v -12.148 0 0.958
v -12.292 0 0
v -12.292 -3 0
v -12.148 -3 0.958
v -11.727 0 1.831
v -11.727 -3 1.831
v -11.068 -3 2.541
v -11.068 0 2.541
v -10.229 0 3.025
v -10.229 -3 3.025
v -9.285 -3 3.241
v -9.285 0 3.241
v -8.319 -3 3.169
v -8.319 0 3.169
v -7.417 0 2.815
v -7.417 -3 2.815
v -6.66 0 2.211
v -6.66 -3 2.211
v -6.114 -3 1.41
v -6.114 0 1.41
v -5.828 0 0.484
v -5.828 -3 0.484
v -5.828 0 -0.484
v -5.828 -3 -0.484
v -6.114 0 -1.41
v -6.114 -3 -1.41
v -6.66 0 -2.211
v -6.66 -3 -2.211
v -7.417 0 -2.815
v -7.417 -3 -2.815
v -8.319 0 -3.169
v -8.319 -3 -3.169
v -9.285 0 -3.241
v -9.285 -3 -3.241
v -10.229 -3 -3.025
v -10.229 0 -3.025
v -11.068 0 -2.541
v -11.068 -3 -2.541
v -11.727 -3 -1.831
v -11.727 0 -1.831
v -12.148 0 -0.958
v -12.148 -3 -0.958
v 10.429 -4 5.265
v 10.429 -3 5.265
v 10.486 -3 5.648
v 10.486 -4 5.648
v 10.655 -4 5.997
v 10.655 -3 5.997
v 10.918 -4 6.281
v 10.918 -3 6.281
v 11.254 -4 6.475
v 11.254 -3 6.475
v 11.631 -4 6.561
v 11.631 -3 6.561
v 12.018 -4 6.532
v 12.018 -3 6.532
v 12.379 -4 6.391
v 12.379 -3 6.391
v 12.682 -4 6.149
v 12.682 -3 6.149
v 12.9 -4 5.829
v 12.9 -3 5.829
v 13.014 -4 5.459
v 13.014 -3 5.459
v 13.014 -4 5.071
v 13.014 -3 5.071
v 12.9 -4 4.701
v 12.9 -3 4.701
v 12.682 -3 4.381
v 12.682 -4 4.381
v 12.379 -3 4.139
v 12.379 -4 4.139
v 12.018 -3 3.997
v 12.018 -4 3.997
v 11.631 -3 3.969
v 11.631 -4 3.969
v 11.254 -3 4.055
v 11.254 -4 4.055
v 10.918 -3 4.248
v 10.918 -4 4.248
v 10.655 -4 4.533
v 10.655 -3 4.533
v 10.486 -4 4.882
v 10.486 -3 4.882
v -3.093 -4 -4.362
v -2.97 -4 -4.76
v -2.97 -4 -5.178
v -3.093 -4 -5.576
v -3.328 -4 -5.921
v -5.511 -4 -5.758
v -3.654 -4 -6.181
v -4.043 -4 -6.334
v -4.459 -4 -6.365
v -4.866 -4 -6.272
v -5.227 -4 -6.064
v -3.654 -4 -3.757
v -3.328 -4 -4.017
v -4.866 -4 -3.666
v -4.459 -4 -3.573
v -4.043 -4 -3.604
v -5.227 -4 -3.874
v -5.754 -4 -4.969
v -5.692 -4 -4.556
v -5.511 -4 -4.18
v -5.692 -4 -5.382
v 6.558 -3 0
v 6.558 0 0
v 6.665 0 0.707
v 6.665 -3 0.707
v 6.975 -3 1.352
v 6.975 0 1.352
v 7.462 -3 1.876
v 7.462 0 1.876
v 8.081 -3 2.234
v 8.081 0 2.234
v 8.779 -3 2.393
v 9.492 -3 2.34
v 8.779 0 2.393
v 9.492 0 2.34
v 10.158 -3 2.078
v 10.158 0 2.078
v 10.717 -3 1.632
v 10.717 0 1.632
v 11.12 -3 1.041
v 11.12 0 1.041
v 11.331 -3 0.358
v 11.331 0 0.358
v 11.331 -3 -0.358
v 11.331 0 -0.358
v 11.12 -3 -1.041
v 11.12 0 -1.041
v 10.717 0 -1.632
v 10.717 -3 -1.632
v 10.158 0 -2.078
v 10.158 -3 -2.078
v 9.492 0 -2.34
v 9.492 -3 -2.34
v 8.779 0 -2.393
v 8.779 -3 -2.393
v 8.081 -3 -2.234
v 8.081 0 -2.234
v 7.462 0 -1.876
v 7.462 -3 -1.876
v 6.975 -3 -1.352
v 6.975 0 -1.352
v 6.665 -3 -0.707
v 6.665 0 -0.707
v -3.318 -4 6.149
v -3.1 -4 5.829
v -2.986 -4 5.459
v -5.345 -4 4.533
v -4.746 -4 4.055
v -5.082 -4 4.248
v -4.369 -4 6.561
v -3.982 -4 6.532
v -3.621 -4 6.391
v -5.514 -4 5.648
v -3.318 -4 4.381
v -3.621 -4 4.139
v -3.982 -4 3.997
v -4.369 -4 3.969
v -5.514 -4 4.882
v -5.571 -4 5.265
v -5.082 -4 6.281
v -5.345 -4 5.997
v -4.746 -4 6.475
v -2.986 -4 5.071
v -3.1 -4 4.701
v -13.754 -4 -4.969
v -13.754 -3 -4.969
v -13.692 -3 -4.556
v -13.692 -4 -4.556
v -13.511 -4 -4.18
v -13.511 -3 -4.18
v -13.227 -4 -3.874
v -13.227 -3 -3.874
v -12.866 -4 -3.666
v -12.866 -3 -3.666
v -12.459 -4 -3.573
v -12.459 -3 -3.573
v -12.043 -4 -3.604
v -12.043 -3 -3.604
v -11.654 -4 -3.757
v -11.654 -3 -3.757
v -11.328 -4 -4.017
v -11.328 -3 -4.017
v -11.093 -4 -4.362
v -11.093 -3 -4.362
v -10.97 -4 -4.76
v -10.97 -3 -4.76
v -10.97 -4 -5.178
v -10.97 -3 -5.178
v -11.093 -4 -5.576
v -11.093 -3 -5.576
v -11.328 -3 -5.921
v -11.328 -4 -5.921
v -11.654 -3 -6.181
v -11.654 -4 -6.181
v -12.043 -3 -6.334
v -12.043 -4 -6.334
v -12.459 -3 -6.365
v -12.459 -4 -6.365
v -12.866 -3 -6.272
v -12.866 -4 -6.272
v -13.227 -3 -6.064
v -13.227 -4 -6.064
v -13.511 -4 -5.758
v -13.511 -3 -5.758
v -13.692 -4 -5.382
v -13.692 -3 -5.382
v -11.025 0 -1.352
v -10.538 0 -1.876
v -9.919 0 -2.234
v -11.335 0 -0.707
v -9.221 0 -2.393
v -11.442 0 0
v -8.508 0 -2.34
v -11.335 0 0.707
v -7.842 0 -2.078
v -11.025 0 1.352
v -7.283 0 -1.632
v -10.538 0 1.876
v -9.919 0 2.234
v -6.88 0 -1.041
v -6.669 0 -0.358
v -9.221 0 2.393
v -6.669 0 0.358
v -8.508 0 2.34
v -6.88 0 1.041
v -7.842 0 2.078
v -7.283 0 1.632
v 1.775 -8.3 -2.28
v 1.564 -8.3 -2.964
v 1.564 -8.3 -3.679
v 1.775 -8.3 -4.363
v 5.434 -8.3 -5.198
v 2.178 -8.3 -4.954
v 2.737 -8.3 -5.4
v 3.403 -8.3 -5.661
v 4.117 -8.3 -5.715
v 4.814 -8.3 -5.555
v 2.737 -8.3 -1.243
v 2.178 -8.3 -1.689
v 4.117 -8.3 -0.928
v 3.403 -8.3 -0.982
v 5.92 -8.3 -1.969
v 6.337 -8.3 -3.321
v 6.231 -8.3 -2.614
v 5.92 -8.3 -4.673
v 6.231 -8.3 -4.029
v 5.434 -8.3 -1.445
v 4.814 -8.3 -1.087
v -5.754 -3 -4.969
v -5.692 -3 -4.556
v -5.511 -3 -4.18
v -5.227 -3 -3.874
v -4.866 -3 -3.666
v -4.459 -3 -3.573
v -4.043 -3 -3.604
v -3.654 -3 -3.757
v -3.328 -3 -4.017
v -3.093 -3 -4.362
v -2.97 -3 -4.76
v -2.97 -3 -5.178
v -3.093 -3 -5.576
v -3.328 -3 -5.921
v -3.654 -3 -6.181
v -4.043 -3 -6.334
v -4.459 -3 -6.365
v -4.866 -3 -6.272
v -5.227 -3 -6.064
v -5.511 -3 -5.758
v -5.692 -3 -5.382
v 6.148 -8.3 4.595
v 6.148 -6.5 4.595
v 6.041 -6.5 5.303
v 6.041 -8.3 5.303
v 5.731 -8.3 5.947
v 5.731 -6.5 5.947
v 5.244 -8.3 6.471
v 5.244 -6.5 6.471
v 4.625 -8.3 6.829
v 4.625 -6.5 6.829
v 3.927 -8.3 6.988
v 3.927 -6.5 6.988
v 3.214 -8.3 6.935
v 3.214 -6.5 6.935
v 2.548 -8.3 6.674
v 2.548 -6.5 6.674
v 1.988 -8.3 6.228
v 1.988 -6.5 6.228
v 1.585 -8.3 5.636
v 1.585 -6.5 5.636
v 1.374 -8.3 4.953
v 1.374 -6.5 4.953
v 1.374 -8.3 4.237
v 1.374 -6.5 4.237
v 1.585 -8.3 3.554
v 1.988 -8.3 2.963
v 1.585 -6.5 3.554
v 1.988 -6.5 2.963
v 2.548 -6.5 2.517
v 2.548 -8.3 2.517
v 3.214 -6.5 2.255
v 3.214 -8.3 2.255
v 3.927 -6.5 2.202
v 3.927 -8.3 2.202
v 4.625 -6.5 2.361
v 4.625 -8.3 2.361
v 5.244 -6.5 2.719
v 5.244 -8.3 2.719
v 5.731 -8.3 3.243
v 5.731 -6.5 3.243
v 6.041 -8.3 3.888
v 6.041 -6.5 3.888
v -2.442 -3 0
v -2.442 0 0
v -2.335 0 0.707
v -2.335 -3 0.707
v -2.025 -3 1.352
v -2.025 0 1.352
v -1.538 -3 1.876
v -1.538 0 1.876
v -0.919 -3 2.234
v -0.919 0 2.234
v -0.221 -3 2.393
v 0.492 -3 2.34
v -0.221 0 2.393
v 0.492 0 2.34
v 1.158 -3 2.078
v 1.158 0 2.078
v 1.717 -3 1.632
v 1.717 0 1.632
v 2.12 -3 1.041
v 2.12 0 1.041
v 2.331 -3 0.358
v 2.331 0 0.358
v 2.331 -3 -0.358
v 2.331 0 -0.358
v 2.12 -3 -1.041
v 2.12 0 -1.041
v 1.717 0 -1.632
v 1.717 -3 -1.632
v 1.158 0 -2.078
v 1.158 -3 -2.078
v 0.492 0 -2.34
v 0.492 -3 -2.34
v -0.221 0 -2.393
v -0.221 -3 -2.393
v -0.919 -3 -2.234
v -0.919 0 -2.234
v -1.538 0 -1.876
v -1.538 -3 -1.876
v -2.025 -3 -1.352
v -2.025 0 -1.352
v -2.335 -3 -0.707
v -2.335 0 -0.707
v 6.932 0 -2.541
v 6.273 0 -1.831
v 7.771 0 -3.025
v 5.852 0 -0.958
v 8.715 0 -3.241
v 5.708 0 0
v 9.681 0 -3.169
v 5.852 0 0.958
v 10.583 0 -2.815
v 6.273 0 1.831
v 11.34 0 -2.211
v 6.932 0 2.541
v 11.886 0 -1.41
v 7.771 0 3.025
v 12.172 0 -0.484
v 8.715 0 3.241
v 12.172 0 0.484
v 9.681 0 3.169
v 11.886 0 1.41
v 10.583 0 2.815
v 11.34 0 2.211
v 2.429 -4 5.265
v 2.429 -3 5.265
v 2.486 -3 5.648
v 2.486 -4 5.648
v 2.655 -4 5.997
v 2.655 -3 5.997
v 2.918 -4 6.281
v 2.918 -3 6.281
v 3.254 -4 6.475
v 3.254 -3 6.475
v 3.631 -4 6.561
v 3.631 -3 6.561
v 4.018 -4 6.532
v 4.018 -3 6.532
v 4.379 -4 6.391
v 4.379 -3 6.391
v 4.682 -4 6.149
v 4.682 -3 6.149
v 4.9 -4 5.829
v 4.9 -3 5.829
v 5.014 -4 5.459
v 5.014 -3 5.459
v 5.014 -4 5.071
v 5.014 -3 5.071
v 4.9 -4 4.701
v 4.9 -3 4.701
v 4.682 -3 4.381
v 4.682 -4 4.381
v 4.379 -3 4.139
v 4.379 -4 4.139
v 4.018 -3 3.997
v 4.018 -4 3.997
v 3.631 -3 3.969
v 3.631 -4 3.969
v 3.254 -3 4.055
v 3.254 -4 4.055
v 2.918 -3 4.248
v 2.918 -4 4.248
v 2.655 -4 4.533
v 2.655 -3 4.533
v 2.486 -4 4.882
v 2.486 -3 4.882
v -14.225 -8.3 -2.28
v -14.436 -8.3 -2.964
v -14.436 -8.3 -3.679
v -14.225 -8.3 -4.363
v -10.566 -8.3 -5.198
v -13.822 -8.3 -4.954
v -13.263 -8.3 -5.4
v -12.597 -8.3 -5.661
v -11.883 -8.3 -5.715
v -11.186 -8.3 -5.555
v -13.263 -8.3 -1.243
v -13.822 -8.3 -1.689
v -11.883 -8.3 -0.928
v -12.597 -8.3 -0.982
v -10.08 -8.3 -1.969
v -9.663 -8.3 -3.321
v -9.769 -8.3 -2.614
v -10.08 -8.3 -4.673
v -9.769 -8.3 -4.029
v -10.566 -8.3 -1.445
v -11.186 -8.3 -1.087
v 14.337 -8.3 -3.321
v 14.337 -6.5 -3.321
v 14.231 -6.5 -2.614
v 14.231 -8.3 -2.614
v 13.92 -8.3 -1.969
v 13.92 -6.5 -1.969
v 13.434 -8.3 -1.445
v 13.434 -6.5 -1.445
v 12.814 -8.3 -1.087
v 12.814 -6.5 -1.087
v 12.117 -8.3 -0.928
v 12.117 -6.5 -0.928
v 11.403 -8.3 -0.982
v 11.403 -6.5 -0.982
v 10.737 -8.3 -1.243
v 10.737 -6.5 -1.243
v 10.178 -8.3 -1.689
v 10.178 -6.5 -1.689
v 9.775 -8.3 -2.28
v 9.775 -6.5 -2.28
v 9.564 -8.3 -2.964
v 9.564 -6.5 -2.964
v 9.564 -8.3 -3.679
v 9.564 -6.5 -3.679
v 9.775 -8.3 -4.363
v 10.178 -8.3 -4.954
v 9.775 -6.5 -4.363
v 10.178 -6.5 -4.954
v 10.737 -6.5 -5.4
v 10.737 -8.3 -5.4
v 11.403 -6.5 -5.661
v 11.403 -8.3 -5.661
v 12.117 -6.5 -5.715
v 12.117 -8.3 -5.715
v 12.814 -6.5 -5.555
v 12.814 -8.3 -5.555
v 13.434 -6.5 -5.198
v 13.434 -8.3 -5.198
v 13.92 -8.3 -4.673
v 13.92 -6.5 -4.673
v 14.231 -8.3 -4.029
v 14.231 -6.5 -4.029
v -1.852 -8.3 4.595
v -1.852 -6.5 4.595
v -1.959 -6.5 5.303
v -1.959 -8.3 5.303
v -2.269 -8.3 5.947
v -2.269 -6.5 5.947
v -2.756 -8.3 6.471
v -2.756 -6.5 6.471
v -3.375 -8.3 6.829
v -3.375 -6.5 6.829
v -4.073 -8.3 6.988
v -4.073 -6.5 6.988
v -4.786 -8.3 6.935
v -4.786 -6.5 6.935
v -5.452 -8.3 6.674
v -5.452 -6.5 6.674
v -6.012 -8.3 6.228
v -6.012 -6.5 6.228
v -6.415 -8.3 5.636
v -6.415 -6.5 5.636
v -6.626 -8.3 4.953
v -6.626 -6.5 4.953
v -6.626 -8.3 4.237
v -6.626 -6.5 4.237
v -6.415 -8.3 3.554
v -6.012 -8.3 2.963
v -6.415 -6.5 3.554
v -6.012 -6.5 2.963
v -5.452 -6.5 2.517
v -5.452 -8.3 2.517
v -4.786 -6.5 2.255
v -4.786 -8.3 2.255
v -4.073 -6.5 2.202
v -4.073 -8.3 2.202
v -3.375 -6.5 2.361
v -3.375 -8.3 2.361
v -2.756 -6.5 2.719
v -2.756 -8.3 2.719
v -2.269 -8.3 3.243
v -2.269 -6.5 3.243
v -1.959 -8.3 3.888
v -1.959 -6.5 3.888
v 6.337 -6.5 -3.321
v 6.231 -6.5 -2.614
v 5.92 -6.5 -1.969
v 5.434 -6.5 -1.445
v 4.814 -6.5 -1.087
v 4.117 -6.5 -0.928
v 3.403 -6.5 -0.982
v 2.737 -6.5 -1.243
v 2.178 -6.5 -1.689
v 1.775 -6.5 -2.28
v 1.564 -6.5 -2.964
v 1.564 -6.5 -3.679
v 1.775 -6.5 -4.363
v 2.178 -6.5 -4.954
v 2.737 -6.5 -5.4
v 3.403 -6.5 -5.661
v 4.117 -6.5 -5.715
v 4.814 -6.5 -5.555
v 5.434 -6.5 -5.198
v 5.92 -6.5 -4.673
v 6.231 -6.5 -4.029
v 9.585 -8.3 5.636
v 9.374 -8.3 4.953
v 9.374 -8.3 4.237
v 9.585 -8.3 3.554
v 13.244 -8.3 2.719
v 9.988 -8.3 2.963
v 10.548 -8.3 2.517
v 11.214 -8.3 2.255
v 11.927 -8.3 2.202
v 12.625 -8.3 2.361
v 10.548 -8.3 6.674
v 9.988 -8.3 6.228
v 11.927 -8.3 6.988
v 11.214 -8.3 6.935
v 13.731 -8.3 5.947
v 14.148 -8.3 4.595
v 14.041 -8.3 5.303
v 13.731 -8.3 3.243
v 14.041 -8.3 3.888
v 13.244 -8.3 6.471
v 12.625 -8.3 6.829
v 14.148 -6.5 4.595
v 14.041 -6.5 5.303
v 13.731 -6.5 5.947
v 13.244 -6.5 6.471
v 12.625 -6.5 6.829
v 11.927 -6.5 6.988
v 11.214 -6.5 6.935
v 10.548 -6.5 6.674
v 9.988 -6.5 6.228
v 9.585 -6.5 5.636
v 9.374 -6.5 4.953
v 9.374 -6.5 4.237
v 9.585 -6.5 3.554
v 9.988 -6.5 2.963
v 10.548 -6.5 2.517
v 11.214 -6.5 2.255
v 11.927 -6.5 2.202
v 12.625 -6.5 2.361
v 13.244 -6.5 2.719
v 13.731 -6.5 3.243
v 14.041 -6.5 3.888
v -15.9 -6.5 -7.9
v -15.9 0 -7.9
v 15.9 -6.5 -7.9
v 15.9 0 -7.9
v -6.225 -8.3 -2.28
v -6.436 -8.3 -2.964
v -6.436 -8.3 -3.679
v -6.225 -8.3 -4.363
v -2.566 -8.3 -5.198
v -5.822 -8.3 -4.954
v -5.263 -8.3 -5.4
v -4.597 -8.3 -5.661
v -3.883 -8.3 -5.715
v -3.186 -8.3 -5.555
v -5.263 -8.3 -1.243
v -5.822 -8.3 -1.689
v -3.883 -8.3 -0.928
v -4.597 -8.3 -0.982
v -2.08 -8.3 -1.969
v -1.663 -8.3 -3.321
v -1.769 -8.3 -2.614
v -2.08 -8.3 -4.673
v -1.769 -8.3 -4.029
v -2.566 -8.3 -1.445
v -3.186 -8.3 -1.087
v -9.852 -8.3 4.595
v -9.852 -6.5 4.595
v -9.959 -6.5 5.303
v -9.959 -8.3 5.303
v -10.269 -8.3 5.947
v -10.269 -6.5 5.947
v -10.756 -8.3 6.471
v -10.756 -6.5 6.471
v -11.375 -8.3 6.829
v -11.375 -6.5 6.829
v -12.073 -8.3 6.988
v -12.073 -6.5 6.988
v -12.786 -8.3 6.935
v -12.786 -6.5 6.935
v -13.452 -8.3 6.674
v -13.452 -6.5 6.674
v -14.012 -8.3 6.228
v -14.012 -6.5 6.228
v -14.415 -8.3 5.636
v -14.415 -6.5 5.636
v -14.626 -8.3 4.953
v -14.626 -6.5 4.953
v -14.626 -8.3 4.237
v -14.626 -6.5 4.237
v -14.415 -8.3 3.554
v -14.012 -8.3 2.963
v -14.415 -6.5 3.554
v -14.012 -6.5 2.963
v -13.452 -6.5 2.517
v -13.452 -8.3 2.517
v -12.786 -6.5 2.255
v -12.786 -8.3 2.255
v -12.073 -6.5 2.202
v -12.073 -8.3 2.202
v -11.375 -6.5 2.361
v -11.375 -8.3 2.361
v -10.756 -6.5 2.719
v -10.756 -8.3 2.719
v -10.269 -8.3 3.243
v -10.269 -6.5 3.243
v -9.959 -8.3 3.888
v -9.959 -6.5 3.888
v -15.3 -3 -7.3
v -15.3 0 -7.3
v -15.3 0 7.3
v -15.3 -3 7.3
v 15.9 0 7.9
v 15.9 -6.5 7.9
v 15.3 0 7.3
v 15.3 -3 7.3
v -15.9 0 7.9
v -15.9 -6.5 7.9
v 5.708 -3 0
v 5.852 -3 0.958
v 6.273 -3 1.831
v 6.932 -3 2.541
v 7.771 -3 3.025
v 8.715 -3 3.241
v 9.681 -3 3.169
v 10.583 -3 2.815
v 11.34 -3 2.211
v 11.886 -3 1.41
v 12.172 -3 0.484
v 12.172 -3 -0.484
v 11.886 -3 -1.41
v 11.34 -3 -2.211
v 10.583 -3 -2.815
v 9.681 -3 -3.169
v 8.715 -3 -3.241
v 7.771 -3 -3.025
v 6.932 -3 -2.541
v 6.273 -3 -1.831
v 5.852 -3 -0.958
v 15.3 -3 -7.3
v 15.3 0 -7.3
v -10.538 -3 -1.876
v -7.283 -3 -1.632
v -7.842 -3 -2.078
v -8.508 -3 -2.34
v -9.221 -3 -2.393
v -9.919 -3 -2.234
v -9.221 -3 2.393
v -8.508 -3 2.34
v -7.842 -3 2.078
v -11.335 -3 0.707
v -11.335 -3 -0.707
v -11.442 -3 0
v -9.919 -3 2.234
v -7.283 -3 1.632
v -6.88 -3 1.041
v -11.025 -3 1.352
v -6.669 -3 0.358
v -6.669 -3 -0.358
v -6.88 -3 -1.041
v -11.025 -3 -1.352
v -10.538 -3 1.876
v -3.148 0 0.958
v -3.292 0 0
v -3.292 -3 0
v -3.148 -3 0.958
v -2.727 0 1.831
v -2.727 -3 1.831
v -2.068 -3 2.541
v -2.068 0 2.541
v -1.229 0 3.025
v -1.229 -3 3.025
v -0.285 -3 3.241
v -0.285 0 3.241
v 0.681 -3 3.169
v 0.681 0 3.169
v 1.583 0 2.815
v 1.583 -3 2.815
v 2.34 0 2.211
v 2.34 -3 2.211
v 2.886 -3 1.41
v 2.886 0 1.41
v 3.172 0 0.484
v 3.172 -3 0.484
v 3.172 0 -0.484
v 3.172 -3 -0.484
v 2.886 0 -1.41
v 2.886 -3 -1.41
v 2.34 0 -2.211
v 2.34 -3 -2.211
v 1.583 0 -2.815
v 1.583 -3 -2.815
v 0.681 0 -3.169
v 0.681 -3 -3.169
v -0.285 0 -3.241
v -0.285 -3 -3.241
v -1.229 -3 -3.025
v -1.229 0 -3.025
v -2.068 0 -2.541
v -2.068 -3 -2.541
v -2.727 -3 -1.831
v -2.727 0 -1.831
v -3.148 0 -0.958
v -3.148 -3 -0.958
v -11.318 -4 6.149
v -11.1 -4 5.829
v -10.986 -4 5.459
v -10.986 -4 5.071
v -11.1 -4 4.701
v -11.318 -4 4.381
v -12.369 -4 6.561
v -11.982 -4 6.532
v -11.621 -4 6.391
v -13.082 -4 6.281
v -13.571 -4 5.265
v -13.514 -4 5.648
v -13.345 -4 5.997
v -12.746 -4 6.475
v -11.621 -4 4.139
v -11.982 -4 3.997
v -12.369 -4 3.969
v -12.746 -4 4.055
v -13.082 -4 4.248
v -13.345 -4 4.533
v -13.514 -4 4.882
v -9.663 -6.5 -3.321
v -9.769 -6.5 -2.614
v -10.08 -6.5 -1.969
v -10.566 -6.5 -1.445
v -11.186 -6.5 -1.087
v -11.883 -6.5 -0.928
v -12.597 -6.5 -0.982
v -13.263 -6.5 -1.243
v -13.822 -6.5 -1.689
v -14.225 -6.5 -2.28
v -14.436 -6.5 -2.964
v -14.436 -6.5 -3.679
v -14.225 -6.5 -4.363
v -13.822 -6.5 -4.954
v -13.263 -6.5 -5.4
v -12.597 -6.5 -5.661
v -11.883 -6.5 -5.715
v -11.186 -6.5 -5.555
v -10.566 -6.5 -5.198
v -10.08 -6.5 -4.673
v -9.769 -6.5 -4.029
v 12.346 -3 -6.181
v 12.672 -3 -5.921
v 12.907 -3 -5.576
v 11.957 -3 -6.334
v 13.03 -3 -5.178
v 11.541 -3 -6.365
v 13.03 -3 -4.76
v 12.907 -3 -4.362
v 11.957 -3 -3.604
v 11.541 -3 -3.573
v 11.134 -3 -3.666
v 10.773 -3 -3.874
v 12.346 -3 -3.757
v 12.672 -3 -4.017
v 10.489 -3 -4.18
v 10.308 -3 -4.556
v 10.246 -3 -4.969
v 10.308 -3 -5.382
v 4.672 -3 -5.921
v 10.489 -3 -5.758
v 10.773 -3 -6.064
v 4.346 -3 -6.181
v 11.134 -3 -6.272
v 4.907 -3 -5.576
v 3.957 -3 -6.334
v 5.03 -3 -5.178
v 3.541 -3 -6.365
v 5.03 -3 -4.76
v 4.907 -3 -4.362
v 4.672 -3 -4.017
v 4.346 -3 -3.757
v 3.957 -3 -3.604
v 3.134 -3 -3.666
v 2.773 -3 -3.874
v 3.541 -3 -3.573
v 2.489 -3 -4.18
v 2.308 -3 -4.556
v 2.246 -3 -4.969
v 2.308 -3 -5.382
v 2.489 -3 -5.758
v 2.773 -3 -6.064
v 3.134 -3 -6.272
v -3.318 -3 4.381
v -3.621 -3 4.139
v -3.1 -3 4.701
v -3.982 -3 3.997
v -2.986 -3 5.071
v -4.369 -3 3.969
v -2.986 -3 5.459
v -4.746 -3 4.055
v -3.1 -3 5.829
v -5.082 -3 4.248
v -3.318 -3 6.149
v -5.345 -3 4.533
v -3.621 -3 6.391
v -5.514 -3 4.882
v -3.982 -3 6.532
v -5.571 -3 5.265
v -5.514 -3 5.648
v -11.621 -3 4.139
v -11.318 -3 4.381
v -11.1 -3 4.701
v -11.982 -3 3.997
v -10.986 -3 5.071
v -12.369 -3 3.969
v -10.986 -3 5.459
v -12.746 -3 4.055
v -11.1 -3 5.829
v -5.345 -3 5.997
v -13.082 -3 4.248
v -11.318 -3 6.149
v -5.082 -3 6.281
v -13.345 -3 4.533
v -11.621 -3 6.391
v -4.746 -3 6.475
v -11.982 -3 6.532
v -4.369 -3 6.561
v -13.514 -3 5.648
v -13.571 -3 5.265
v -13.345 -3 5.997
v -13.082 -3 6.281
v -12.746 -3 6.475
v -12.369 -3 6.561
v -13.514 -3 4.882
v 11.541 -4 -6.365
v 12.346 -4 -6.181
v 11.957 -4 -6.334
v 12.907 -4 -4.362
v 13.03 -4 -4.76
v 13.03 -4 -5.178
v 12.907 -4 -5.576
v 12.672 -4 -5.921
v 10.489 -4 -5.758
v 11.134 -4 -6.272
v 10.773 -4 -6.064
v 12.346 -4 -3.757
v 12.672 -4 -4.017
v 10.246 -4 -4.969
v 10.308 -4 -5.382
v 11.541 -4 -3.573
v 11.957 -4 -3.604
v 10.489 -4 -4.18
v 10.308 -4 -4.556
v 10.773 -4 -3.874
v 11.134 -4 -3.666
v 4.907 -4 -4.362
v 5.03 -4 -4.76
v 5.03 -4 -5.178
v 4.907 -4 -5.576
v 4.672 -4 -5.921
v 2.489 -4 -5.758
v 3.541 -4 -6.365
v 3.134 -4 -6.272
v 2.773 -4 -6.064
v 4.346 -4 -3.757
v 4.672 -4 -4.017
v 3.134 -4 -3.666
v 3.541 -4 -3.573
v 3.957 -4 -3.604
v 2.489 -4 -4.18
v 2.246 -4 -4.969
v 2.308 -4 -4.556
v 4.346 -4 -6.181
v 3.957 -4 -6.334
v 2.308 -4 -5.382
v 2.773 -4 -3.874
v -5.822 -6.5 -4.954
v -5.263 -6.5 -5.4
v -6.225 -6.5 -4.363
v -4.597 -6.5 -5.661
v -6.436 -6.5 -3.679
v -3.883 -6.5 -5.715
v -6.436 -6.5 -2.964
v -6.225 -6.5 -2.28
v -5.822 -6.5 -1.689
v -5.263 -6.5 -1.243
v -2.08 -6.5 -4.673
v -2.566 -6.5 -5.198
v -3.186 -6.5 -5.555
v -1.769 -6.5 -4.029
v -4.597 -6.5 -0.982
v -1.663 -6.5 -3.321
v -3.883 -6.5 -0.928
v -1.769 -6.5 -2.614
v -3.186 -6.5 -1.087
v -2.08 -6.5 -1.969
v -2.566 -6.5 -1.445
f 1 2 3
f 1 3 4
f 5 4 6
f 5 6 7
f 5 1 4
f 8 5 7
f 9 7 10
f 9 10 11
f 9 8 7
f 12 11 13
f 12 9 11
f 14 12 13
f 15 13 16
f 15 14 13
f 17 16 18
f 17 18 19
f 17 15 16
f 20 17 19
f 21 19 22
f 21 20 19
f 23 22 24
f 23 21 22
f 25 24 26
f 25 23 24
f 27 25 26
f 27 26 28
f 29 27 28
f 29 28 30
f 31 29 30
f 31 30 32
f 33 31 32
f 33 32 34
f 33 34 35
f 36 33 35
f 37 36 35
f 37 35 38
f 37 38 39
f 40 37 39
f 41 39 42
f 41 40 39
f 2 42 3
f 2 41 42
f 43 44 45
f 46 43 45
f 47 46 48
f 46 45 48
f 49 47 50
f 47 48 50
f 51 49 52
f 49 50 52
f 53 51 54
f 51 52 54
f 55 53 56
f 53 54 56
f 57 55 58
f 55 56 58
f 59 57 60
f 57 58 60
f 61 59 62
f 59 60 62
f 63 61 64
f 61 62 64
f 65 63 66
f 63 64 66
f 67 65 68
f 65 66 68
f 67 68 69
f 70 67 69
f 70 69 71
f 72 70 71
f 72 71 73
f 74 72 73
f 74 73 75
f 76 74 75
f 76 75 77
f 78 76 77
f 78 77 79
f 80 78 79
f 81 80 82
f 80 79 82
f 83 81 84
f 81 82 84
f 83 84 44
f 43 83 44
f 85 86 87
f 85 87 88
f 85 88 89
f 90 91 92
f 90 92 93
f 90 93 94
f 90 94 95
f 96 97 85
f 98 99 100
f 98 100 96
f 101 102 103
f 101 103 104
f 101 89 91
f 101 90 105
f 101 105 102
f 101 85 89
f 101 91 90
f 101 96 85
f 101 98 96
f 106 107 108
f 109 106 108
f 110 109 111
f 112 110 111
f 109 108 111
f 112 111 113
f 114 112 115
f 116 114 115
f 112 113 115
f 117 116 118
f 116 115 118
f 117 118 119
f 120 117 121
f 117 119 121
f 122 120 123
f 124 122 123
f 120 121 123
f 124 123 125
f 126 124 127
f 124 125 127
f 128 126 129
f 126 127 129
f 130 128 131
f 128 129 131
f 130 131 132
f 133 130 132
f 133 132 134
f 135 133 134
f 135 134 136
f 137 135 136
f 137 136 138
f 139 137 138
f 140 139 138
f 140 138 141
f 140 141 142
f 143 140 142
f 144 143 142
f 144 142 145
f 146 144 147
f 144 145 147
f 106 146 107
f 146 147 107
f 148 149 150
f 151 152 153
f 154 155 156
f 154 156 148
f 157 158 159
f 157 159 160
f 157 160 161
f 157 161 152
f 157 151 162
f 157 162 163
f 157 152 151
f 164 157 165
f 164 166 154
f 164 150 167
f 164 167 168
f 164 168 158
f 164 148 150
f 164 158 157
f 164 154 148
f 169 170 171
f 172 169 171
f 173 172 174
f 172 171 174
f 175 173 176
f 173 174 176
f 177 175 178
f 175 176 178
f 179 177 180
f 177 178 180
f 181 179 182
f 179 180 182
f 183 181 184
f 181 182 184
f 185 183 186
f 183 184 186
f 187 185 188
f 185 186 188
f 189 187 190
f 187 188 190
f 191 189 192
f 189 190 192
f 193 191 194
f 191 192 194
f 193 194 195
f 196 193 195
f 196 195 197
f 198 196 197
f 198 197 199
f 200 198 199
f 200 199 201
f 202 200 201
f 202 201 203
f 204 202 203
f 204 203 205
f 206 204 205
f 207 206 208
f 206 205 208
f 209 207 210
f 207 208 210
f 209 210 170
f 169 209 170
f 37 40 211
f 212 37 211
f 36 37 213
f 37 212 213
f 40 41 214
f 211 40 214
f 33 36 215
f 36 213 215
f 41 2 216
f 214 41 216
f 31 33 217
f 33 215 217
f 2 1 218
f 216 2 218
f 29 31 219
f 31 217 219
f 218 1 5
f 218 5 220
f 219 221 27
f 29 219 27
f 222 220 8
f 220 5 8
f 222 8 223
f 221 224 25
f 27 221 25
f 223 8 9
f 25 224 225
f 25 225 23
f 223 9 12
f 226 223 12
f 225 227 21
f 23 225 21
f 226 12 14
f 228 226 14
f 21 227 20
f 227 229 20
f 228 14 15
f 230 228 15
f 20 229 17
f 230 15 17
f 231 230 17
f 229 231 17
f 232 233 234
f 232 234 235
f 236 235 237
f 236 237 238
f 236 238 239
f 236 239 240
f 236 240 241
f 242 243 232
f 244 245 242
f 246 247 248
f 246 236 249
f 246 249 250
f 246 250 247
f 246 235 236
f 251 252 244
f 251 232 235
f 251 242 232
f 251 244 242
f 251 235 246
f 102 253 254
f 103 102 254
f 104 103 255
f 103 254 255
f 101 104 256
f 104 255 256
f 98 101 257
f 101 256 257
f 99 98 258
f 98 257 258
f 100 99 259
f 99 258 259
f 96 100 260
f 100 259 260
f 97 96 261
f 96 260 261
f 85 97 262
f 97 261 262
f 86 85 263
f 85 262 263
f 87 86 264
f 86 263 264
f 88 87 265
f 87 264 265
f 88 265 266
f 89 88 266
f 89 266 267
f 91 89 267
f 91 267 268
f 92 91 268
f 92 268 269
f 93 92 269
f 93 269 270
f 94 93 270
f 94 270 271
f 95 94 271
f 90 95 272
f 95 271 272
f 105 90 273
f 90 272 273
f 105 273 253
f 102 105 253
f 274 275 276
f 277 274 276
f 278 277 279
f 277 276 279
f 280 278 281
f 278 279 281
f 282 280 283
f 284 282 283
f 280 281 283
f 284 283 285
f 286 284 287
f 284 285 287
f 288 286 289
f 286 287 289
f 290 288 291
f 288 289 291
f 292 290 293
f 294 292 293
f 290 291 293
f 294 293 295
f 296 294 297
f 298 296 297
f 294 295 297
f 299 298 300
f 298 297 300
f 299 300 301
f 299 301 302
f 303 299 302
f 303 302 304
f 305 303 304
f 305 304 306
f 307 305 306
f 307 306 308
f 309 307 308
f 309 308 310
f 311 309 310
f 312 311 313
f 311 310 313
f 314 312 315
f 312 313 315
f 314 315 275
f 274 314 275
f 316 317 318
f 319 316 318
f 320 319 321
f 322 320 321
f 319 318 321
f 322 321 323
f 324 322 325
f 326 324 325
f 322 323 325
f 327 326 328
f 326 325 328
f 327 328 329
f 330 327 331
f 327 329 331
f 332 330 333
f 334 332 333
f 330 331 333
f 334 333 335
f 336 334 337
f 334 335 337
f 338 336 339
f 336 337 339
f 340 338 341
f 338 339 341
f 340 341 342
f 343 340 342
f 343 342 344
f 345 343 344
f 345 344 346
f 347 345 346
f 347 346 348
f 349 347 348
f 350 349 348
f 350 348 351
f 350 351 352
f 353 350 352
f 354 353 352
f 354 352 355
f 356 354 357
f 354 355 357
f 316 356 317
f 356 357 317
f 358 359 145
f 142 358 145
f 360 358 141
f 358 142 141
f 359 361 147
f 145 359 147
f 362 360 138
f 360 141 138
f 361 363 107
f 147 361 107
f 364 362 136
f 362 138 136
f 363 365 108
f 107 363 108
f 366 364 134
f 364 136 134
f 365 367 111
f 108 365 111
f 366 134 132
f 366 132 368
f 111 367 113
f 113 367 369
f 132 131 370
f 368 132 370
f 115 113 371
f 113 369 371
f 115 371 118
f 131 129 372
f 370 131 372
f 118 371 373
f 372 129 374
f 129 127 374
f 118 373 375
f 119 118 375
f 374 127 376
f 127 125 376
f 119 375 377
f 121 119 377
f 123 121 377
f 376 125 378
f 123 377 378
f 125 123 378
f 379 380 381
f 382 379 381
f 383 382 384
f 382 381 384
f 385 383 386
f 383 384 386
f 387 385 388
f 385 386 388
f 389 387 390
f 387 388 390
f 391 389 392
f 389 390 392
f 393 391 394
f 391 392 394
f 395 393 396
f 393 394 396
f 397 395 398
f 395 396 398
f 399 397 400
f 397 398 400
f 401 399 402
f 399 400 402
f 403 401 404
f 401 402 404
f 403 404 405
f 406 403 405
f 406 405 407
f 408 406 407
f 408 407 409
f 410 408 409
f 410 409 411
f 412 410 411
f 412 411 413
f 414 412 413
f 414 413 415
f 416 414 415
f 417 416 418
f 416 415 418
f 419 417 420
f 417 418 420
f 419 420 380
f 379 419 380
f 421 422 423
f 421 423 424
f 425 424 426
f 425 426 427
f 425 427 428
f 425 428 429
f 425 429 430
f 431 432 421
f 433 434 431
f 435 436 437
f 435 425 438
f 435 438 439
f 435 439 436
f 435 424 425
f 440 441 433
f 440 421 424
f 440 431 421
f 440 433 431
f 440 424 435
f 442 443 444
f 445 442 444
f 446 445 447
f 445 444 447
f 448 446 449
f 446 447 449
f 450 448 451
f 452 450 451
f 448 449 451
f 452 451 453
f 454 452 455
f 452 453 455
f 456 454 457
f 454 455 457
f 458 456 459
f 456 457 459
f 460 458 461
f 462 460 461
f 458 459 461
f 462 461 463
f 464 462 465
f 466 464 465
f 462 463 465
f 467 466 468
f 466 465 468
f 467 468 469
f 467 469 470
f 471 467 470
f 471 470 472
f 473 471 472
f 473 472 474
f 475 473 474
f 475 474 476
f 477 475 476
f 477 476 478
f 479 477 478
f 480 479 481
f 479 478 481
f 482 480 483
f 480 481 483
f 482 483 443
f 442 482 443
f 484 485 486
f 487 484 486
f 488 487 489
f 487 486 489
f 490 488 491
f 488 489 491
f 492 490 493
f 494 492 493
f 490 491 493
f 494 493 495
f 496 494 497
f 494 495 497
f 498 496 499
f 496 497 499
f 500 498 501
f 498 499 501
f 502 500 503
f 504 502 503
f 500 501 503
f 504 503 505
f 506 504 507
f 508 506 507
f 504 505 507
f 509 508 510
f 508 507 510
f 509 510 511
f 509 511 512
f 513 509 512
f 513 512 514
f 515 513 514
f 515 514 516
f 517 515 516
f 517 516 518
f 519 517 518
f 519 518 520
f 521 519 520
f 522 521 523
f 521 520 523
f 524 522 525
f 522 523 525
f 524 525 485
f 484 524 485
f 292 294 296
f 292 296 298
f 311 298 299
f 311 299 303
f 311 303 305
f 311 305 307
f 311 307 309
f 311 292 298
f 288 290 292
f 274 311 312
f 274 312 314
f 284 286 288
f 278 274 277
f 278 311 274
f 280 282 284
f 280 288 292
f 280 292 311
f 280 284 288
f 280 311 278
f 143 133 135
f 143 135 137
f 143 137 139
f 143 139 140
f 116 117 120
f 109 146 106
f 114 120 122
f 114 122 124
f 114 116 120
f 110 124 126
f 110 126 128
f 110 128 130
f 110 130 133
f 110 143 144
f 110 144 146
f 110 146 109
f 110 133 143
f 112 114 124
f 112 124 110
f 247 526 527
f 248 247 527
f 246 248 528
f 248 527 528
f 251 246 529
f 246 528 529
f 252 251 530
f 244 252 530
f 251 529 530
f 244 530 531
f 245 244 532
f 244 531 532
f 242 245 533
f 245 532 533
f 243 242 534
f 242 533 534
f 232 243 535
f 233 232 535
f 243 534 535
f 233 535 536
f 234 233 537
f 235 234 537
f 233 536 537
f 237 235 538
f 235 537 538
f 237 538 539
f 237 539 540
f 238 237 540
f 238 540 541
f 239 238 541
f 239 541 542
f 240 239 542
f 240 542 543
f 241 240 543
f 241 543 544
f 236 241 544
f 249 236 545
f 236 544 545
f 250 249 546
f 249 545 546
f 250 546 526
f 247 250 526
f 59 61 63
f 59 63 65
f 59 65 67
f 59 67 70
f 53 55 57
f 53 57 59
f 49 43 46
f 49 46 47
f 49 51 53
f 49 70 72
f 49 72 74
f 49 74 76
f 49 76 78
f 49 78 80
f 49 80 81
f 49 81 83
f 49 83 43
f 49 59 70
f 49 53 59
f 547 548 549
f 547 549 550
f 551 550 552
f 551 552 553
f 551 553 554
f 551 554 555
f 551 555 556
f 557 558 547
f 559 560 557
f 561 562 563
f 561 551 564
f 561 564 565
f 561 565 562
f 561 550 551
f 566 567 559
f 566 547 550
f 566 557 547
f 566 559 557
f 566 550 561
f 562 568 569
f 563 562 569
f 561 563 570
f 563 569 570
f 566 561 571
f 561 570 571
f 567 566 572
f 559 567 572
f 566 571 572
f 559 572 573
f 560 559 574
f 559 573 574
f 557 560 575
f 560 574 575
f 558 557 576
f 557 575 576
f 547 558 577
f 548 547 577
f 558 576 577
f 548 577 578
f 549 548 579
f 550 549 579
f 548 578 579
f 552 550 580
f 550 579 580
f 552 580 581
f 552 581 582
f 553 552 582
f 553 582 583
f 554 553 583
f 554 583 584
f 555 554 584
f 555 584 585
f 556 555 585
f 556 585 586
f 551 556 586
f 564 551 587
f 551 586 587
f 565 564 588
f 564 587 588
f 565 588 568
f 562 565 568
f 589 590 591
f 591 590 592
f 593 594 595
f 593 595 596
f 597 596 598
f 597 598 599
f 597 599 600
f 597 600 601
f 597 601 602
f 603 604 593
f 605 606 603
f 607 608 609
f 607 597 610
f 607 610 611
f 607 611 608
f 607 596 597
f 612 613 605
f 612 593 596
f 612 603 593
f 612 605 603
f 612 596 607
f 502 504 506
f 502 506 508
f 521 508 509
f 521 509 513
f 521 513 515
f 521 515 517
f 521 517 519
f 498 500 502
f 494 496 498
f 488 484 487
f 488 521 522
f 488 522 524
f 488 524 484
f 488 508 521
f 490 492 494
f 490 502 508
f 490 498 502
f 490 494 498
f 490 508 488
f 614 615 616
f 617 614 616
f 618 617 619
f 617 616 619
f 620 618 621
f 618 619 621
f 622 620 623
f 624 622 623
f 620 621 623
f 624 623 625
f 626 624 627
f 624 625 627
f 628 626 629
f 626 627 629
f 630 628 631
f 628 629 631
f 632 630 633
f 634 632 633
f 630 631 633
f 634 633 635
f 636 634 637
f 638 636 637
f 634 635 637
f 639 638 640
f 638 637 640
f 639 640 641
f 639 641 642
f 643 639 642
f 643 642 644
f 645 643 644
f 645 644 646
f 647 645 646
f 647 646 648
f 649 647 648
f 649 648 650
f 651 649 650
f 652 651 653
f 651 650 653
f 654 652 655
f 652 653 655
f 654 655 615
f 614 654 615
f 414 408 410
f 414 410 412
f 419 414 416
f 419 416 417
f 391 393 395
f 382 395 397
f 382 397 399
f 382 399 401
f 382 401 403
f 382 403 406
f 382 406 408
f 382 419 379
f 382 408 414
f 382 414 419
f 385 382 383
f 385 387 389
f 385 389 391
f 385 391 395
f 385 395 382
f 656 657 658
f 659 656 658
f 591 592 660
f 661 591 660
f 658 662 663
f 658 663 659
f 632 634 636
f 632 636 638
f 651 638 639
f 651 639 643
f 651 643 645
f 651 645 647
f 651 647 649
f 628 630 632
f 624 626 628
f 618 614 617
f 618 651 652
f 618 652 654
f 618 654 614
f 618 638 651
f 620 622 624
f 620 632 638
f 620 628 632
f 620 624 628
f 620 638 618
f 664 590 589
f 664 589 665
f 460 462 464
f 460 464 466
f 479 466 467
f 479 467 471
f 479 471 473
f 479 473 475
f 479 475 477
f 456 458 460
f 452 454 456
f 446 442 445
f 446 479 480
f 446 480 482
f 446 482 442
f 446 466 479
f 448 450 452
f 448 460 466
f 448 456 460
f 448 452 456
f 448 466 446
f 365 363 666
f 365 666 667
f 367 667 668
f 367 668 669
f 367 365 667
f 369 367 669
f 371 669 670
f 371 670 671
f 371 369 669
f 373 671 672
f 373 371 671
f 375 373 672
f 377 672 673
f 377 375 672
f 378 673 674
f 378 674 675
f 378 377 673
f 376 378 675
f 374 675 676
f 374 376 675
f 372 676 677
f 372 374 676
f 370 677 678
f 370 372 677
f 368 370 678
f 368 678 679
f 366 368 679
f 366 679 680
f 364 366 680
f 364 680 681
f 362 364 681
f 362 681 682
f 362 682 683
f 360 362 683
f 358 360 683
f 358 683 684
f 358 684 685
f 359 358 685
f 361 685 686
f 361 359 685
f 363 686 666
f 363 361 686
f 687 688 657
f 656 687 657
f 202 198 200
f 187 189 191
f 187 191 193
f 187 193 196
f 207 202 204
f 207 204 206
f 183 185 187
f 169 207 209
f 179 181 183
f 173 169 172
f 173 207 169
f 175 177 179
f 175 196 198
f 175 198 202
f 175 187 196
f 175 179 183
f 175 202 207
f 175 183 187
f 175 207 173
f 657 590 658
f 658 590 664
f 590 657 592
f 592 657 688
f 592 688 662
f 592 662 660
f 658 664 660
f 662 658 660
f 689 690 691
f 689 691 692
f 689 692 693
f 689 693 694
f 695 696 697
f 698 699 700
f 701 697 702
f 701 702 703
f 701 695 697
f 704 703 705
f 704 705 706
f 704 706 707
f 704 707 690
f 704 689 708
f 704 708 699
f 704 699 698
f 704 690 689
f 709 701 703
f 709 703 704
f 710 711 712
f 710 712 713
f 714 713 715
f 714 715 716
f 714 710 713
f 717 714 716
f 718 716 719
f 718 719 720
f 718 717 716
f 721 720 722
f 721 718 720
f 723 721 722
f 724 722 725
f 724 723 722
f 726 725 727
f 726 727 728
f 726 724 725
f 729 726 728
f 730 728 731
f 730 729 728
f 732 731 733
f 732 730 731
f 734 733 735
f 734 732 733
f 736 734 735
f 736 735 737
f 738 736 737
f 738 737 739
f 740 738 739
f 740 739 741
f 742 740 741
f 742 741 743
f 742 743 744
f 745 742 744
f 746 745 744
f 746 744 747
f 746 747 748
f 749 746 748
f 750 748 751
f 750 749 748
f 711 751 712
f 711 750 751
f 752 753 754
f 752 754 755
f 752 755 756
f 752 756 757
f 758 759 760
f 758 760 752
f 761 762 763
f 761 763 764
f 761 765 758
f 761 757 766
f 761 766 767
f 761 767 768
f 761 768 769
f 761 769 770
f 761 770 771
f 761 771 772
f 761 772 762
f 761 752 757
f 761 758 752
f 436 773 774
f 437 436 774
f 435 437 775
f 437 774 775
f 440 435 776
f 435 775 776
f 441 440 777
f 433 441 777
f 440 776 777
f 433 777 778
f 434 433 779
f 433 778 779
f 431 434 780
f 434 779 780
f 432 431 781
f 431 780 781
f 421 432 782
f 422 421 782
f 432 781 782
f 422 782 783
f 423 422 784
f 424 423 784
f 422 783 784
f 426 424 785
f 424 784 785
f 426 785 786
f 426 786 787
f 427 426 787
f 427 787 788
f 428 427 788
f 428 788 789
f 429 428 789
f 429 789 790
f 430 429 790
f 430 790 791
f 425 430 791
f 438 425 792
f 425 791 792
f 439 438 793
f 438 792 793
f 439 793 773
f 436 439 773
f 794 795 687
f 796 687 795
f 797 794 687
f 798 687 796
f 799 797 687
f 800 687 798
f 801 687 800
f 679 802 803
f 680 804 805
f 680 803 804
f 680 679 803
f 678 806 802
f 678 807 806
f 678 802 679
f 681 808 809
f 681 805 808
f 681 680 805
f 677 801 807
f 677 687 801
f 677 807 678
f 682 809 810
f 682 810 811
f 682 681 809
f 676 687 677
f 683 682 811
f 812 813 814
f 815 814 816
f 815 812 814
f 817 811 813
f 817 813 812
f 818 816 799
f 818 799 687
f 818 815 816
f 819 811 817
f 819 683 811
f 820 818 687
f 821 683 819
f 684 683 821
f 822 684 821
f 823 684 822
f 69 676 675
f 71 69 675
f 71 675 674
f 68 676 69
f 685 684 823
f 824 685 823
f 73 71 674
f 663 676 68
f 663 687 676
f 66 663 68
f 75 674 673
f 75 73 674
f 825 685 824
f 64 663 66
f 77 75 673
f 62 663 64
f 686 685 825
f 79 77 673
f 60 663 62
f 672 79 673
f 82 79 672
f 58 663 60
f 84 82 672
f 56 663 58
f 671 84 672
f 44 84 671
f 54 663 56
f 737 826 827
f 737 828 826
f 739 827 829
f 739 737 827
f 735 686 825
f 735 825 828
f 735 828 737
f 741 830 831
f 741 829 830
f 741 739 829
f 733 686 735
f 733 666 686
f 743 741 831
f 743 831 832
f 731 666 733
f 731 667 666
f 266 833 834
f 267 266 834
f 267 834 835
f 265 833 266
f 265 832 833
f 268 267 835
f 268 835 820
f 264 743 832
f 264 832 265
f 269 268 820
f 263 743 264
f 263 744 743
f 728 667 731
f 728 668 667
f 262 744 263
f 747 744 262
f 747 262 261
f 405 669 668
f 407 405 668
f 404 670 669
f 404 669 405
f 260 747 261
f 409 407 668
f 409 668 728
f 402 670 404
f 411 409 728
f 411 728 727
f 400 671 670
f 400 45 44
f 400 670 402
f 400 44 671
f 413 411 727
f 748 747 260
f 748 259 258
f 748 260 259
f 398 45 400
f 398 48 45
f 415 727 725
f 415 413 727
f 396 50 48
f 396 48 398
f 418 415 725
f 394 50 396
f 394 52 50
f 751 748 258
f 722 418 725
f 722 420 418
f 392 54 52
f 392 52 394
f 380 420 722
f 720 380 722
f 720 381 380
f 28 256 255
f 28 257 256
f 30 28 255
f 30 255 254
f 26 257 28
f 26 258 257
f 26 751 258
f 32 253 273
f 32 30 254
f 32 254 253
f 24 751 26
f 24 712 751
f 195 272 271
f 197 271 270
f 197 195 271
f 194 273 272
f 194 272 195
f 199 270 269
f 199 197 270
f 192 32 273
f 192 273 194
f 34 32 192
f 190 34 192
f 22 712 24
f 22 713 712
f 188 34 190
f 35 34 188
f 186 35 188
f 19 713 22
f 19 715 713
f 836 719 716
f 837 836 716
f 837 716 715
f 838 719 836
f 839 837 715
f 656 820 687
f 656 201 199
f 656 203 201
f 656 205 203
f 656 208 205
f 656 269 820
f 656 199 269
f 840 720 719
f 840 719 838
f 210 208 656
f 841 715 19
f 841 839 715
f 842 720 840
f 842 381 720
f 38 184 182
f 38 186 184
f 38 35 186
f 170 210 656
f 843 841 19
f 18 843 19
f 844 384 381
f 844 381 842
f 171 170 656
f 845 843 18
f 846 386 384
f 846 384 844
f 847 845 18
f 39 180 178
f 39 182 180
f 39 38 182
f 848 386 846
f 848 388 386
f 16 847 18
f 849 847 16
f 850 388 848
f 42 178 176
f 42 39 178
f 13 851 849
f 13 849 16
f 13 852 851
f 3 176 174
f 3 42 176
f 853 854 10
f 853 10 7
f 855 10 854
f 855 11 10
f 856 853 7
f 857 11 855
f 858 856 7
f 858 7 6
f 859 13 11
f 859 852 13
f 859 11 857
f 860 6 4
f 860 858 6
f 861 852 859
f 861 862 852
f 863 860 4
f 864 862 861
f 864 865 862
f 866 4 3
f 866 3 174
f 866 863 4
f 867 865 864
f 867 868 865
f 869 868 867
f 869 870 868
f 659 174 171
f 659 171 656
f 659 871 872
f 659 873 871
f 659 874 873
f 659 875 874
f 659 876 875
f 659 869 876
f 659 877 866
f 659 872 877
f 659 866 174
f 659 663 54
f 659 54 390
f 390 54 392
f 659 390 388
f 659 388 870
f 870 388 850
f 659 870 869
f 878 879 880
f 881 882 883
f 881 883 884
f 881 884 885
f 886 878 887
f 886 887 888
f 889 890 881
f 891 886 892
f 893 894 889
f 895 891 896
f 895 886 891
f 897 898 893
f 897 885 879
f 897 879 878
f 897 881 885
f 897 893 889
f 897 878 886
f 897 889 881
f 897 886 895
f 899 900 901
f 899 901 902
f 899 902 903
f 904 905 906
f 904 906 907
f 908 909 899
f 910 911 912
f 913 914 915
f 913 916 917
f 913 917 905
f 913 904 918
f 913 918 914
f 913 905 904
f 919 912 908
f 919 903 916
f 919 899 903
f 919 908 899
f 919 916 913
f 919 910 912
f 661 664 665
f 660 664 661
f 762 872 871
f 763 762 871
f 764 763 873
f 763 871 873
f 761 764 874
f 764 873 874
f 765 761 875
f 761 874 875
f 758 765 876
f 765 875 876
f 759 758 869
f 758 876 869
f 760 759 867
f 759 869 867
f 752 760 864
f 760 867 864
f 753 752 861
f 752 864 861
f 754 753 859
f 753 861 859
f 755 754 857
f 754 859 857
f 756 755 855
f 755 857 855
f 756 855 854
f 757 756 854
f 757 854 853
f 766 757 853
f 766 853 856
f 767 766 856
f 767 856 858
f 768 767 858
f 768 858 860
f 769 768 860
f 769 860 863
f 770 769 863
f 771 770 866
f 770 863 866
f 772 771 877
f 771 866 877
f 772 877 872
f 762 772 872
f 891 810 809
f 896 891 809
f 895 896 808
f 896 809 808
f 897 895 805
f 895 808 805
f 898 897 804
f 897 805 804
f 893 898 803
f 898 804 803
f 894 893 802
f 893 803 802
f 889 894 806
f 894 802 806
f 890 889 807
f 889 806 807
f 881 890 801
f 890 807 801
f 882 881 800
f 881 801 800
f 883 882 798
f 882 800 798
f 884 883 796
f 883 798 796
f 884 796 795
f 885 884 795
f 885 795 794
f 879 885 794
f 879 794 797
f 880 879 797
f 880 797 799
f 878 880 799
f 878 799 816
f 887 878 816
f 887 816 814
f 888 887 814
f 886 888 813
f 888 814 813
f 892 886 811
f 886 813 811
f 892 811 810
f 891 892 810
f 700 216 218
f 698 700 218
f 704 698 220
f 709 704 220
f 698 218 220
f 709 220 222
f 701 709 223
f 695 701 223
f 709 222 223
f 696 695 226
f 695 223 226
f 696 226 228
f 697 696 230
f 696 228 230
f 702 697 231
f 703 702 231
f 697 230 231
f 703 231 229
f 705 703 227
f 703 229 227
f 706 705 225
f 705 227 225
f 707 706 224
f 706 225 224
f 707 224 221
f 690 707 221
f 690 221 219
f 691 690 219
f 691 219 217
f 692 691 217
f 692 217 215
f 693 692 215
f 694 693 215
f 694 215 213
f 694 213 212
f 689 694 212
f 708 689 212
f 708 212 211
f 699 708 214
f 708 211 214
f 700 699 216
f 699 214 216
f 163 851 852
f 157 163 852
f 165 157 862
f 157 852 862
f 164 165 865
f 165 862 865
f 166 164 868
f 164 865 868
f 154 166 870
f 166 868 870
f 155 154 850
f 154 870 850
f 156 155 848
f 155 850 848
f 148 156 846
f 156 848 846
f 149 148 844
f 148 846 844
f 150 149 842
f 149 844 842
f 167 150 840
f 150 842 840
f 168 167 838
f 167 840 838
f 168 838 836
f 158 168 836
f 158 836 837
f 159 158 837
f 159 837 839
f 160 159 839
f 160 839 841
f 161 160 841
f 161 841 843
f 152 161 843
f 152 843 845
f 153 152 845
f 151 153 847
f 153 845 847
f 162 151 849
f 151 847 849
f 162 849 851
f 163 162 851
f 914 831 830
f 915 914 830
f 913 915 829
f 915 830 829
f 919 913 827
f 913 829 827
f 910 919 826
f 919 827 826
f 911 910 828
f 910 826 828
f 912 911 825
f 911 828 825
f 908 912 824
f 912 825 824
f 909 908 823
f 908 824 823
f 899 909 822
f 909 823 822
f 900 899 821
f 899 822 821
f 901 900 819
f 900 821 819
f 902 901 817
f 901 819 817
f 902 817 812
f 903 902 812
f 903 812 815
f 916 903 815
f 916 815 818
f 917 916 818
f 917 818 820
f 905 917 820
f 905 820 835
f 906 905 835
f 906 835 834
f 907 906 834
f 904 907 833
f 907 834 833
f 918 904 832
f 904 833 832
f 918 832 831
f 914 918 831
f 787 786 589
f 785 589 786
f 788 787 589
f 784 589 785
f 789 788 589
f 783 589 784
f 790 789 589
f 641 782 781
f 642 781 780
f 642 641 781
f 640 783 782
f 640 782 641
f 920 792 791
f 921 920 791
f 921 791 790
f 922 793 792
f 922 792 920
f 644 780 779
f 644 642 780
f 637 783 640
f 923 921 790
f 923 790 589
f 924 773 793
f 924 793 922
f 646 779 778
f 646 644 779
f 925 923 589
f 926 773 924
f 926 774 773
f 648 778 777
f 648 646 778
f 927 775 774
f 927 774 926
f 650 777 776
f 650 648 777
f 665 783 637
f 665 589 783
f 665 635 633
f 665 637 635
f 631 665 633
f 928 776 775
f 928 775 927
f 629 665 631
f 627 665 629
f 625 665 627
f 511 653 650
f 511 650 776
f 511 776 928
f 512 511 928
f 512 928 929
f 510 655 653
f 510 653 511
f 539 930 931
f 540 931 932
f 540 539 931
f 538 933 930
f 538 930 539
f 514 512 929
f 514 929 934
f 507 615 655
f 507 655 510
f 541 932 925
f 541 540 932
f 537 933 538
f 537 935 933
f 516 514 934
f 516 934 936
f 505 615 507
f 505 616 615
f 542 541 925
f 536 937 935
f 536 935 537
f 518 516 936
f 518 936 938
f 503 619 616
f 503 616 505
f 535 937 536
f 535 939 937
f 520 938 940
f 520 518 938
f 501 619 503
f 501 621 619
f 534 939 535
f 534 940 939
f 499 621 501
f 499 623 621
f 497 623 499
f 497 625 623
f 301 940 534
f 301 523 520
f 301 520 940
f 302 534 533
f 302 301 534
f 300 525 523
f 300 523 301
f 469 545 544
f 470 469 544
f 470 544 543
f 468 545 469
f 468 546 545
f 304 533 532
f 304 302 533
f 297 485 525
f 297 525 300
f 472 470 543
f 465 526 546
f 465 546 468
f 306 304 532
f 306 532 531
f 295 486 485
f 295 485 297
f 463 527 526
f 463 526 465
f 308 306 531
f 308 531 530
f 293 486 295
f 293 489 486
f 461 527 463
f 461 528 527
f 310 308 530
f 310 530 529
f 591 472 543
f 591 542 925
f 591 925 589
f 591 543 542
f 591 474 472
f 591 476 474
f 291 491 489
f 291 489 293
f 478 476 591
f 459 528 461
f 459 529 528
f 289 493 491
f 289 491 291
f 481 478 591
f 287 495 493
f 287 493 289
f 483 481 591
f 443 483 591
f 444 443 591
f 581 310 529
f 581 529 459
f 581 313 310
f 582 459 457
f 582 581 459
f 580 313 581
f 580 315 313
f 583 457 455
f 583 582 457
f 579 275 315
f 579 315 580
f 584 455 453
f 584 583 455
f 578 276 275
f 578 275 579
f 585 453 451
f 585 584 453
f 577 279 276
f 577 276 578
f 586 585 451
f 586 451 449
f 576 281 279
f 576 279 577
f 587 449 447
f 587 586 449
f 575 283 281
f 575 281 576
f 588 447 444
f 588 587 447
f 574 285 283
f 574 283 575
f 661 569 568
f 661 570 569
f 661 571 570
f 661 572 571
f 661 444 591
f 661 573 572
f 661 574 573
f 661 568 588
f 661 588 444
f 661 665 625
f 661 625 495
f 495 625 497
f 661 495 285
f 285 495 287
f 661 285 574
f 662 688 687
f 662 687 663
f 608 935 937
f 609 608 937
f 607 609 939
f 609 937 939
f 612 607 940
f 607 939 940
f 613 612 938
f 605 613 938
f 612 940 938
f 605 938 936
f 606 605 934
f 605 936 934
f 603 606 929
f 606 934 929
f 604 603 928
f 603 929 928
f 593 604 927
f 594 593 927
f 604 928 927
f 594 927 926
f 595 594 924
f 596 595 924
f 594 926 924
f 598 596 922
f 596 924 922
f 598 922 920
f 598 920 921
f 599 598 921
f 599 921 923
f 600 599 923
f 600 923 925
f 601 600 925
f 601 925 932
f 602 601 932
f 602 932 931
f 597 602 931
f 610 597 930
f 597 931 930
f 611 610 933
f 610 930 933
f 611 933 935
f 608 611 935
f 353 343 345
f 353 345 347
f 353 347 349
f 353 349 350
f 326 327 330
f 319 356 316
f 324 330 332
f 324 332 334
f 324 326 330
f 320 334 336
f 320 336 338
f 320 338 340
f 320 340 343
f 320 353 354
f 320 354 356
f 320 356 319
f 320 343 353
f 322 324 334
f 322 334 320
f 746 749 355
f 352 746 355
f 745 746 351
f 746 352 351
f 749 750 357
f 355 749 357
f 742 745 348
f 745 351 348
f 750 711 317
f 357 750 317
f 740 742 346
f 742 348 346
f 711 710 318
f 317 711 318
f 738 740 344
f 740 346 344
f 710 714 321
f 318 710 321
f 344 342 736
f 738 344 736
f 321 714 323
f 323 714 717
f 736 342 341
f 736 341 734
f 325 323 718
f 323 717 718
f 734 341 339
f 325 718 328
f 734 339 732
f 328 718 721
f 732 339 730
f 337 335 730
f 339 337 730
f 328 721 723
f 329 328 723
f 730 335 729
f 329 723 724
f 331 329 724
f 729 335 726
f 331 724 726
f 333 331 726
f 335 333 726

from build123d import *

# Parameters (mm, degrees)
F0_W      = 31.8
F0_H      = 15.8
F1_DEPTH  = 6.5
F3_R      = 2.4
F4_DEPTH  = 1.8
F2_R      = 2.4
F5_DEPTH  = 1.8
F6_W      = 30.6
F6_H      = 14.6
F6_R      = 3.25
F6_R_2    = 2.4
F7_DEPTH  = 3
F8_R      = 1.3
F9_DEPTH  = 1
F10_R     = 1.4
F11_DEPTH = 1


with BuildPart() as f1:
    # F0 (on Front) → F1 (new body)
    with BuildSketch(Plane.XZ):
        Rectangle(F0_W, F0_H)
    extrude(amount=F1_DEPTH)

    # F3 (on face) → F4 (join)
    with BuildSketch(Plane.XZ.offset(6.5)):
        with Locations((-12.062647, -3.321402)):
            Circle(F3_R)
        with Locations((-4.062647, -3.321402)):
            Circle(F3_R)
        with Locations((3.937353, -3.321402)):
            Circle(F3_R)
        with Locations((11.937353, -3.321402)):
            Circle(F3_R)
    extrude(amount=F4_DEPTH)

    # F2 (on face) → F5 (join)
    with BuildSketch(Plane.XZ.offset(6.5)):
        with Locations((-12.252313, 4.5951)):
            Circle(F2_R)
        with Locations((-4.252313, 4.5951)):
            Circle(F2_R)
        with Locations((3.747687, 4.5951)):
            Circle(F2_R)
        with Locations((11.747687, 4.5951)):
            Circle(F2_R)
    extrude(amount=F5_DEPTH)

    # F6 (on face) → F7 (cut)
    with BuildSketch(Plane(origin=(0, 0, 0), x_dir=(-1, 0, 0), z_dir=(0, 1, 0))):
        Rectangle(F6_W, F6_H)
        with Locations((-8.957913, 0)):
            Circle(F6_R, mode=Mode.SUBTRACT)
        with Locations((0.042087, 0)):
            Circle(F6_R, mode=Mode.SUBTRACT)
        with Locations((9.042087, 0)):
            Circle(F6_R, mode=Mode.SUBTRACT)
        with Locations((-8.957913, 0)):
            Circle(F6_R_2)
        with Locations((0.042087, 0)):
            Circle(F6_R_2)
        with Locations((9.042087, 0)):
            Circle(F6_R_2)
    extrude(amount=-F7_DEPTH, mode=Mode.SUBTRACT)

    # F8 (on face) → F9 (cut)
    with BuildSketch(Plane(origin=(0, -3, 0), x_dir=(-1, 0, 0), z_dir=(0, 1, 0))):
        with Locations((-11.72863, 5.264877)):
            Circle(F8_R)
        with Locations((-3.72863, 5.264877)):
            Circle(F8_R)
        with Locations((4.27137, 5.264877)):
            Circle(F8_R)
        with Locations((12.27137, 5.264877)):
            Circle(F8_R)
    extrude(amount=-F9_DEPTH, mode=Mode.SUBTRACT)

    # F10 (on face) → F11 (cut)
    with BuildSketch(Plane(origin=(0, -3, 0), x_dir=(-1, 0, 0), z_dir=(0, 1, 0))):
        with Locations((-11.645505, -4.969024)):
            Circle(F10_R)
        with Locations((-3.645505, -4.969024)):
            Circle(F10_R)
        with Locations((4.354495, -4.969024)):
            Circle(F10_R)
        with Locations((12.354495, -4.969024)):
            Circle(F10_R)
    extrude(amount=-F11_DEPTH, mode=Mode.SUBTRACT)


solid = f1.part
